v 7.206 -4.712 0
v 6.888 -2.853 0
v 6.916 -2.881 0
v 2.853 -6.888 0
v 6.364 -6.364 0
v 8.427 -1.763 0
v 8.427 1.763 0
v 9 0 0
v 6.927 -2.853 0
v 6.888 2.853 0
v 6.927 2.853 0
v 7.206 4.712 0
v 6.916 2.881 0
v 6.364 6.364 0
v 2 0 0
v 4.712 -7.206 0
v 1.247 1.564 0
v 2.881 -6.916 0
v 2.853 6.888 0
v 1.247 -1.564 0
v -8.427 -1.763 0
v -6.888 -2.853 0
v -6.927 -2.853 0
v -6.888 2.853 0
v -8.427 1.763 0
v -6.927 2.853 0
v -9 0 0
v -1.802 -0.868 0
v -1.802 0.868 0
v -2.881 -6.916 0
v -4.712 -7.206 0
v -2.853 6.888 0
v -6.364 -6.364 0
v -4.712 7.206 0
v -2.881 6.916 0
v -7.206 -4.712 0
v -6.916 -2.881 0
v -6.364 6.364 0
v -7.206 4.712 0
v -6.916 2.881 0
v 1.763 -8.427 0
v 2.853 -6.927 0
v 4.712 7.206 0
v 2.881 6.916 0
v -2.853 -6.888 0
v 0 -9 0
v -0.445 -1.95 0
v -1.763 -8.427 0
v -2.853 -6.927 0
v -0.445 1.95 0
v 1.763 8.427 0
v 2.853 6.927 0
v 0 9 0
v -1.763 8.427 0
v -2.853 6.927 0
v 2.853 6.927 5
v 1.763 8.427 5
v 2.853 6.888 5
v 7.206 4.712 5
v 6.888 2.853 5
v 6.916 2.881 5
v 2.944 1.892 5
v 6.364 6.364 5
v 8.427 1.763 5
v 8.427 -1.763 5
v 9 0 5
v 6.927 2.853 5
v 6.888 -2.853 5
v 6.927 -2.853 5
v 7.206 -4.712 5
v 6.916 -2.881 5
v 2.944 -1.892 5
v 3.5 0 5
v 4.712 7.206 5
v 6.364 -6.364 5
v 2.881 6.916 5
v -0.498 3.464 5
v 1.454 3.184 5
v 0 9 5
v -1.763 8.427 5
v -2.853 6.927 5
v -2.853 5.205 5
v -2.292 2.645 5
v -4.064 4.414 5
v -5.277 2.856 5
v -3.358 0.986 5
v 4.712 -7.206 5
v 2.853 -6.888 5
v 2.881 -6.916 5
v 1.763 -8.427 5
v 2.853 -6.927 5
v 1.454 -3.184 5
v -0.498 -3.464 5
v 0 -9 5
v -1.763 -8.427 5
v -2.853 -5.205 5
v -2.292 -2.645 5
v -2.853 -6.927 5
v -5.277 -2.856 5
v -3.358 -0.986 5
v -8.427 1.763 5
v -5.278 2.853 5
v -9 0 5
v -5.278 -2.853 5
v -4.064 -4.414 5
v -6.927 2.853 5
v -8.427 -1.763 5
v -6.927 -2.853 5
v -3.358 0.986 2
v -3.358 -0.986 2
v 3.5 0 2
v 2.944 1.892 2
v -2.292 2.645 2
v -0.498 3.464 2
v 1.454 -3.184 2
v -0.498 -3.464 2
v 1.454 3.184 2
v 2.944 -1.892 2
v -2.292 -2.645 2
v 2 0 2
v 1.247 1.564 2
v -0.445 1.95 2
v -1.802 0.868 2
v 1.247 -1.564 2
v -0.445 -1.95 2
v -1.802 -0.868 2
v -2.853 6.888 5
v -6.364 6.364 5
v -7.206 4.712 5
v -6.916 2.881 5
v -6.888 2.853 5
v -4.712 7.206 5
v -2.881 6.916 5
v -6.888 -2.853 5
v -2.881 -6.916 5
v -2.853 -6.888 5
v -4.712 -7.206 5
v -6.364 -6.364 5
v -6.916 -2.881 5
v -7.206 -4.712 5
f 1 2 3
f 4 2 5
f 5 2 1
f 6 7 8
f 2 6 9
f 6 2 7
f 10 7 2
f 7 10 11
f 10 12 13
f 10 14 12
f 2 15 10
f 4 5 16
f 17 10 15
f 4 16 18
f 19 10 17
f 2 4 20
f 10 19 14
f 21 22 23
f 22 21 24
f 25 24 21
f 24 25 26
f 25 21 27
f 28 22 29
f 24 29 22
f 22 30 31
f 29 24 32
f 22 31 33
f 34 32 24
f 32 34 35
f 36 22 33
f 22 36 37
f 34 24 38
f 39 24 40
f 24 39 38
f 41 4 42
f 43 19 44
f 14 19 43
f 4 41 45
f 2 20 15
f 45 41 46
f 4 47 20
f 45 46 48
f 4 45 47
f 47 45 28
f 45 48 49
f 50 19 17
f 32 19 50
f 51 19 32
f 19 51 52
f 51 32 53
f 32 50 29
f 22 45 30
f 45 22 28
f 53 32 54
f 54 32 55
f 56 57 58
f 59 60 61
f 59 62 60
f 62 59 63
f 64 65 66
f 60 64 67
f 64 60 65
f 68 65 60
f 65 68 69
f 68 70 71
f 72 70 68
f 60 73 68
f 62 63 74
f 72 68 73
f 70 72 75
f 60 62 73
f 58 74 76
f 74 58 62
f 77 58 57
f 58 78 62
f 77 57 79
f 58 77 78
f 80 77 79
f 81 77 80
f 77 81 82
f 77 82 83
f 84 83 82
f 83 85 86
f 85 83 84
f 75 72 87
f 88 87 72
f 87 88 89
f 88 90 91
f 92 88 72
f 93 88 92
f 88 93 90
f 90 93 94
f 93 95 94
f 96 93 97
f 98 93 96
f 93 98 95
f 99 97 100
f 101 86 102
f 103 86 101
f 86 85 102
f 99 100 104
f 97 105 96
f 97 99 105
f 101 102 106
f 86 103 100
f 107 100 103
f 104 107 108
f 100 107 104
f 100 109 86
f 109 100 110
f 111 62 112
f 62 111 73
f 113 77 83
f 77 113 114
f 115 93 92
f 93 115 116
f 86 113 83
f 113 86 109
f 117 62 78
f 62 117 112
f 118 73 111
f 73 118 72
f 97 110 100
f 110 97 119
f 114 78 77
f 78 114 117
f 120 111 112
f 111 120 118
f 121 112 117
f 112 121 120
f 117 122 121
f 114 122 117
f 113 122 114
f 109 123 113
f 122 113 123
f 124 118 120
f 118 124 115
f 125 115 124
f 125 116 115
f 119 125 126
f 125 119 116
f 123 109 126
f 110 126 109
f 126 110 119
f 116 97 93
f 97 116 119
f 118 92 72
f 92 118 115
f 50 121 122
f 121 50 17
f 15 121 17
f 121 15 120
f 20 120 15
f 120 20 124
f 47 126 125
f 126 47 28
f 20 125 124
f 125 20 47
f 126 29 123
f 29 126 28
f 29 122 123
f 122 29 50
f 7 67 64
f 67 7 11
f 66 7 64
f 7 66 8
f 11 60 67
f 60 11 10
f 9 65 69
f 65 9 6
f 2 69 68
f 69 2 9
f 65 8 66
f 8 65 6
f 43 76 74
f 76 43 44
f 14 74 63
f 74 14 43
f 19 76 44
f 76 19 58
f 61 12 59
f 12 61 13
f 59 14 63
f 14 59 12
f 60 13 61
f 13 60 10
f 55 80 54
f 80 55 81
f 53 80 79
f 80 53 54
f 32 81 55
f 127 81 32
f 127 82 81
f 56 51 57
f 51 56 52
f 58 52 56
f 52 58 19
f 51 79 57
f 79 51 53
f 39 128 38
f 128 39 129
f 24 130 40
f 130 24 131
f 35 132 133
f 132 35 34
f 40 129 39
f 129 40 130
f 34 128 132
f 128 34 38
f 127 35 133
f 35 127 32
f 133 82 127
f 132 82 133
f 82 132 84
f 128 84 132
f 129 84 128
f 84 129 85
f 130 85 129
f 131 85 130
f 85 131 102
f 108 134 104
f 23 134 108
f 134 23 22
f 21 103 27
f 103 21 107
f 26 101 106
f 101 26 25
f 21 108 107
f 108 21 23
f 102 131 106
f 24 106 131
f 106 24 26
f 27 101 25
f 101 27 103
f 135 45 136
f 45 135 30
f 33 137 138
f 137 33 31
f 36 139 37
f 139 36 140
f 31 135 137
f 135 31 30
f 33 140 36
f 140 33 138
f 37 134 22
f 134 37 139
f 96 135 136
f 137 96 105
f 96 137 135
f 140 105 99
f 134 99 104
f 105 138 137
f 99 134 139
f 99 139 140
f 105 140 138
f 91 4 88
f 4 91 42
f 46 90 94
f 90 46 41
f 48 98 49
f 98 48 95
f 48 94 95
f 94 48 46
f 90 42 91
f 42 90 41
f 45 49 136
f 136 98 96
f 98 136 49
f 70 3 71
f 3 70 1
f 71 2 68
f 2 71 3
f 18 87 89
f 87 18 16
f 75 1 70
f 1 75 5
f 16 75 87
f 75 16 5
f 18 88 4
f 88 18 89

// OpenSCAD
x=25.4; //Diameter of the Lens
y=10;   //Lens holder Thickness
z=3;     //Lens Holder Lip Size
X=25; //Base Diameter
Y=25;  //Base Height
a=3; //Set Screw Diameter
b=6; //Set Screw Nut Daimeter
c=3; //Set Screw Nut Thickness
d=8; //Guide Rod Diameter
e=20; //Guide Rod Length
f=3;    // Thumb Screw Head Height
g=6;   //Thumb Screw Head Diameter
i=3;    //Thumb Screw Diameter
j=3;    //PL Board Hole Diameter
thumbscrew();

module thumbscrew(){
difference(){
cylinder(f+2,(g+6)/2, (g+6)/2);
translate([0,0,2])cylinder(5,(g+1)/2, (g+1)/2);
cylinder(5,(i+1)/2, (i+1)/2);
}
difference(){
	for ( i = [0 :8] ){
					rotate( i * 360 / 8, [0, 0, 1])
					translate([(g+6)/2,0,0])
					cylinder(5,3,3);
		}	
translate([0,0,2])cylinder(5,(g+1)/2, (g+1)/2);
}
}

module mount(){
difference(){
cylinder((2/5)*Y,X/2,X/2);
translate([0,0,(1/5)*Y])cylinder(Y,(d+1)/2,(d+1)/2);
}
difference(){
translate([0,0,(2/5)*Y])cylinder((2/5)*Y,X/2,(d+6)/2);
cylinder(Y,(d+1)/2,(d+1)/2);

}
difference(){
translate([0,0,(4/5)*Y])cylinder((1/5)*Y,(d+6)/2,(d+6)/2);
cylinder(Y,(d+1)/2,(d+1)/2);

}
difference(){
translate([0,(X/2)+3,0])cylinder(5,(j+6)/2, (j+6)/2);
translate([0,(X/2)+3,0])cylinder(5,(j+1)/2, (j+1)/2);
}
difference(){
translate([0,(X/2)-2,5/2])cube([j+6,j+6,5],center = true);
translate([0,(X/2)+3,0])cylinder(5,(j+1)/2, (j+1)/2);
}
}

module lens_holder(){
difference(){
cylinder(y/2,(x+10)/2,(x+10)/2);
cylinder((y+2)/2,(x-3)/2,(x-3)/2);
translate([0,0,1.5])cylinder((y+2)/2,(x+1)/2,(x+1)/2);
translate([0,(x+10)/2+5,(b+3)/2])rotate([90,0,0])cylinder(10,(a+1)/2,(a+1)/2);
translate([0,(x+8)/2,(b+3)/2])nuttrap();
translate([(x+15)/2,e/2,(d+6)/2])rotate([90,0,0])cylinder(e,(d+6)/2, (d+6)/2);
}
difference(){
translate([0,0,y/2])cylinder((y)/2,(x+5)/2,(x+5)/2);
cylinder((y)*2,(x+1)/2,(x+1)/2);
translate([0,(x+10)/2+5,(b+3)/2])rotate([90,0,0])cylinder(25,(b+3)/2,(b+3)/2);
translate([0,(x+8)/2,(b+3)/2])nuttrap();
}
difference(){
translate([0,(x+8)/2,0])set_screw((b+3)/2);
cylinder((y+2),(x+1)/2,(x+1)/2);
}
difference(){
translate([(x+15)/2,0,0])guide_rod();
rotate([0,0,90]){
#translate([0,((x+7)/-2)-((d)),(d+6)/2])rotate([90,0,0])cylinder(50,(a+1)/2,(a+1)/2);
translate([((x+7.5)/2)+((d+6)),0,0])rotate([0,0,90])set_screw1((d+6)/2);
}
}
translate([((x+7.5)/2)+((d+6)),0,0])rotate([0,0,90])set_screw((d+6)/2);
}

module guide_rod(){
difference(){
translate([0,e/2,(d+6)/2])rotate([90,0,0])cylinder(e,(d+6)/2, (d+6)/2);
translate([0,(e/2)+1,(d+6)/2])rotate([90,0,0])cylinder(e+2,(d+1)/2, (d+1)/2);
}
difference(){
translate([0,0,(d+6)/4])cube([(d+6),e,(d+6)/2], center = true);
translate([0,(e/2)+1,(d+6)/2])rotate([90,0,0])cylinder(e+2,(d+1)/2, (d+1)/2);
}
}

module set_screw(h){
difference(){
translate([0,5,h])rotate([90,0,0])cylinder(10,(b+3)/2, (b+3)/2);
#translate([0,10,h])rotate([90,0,0])cylinder(200,(a+1)/2, (a+1)/2);
translate([0,0,h])nuttrap();
}
difference(){
translate([0,0,h/2])cube([(b+3),10,h], center = true);
translate([0,6,h])rotate([90,0,0])cylinder(12,(a+1)/2, (a+1)/2);
translate([0,0,h])nuttrap();
}
}
module set_screw1(h){
translate([0,5,h])rotate([90,0,0])cylinder(10,(b+3)/2, (b+3)/2);
translate([0,0,h/2])cube([(b+3),10,h], center = true);

}



module nuttrap(){
translate([0,(c+1)/2,0])rotate([90,0,0])hexagon(c+1,(b+1)/2);
translate([0,0,(b*3)/2])cube([b+1,c+1,b*3],center = true);
}

module reg_polygon(sides,radius)
{
  function dia(r) = sqrt(pow(r*2,2)/2);  //sqrt((r*2^2)/2) if only we had an exponention op
  if(sides<2) square([radius,0]);
  if(sides==3) triangle(radius);
  if(sides==4) square([dia(radius),dia(radius)],center=true);
  if(sides>4) circle(r=radius,$fn=sides);
}

module hexagonf(radius)
{
  reg_polygon(6,radius);
}

module hexagon(height,radius) 
{
  linear_extrude(height=height) hexagonf(radius);
}
